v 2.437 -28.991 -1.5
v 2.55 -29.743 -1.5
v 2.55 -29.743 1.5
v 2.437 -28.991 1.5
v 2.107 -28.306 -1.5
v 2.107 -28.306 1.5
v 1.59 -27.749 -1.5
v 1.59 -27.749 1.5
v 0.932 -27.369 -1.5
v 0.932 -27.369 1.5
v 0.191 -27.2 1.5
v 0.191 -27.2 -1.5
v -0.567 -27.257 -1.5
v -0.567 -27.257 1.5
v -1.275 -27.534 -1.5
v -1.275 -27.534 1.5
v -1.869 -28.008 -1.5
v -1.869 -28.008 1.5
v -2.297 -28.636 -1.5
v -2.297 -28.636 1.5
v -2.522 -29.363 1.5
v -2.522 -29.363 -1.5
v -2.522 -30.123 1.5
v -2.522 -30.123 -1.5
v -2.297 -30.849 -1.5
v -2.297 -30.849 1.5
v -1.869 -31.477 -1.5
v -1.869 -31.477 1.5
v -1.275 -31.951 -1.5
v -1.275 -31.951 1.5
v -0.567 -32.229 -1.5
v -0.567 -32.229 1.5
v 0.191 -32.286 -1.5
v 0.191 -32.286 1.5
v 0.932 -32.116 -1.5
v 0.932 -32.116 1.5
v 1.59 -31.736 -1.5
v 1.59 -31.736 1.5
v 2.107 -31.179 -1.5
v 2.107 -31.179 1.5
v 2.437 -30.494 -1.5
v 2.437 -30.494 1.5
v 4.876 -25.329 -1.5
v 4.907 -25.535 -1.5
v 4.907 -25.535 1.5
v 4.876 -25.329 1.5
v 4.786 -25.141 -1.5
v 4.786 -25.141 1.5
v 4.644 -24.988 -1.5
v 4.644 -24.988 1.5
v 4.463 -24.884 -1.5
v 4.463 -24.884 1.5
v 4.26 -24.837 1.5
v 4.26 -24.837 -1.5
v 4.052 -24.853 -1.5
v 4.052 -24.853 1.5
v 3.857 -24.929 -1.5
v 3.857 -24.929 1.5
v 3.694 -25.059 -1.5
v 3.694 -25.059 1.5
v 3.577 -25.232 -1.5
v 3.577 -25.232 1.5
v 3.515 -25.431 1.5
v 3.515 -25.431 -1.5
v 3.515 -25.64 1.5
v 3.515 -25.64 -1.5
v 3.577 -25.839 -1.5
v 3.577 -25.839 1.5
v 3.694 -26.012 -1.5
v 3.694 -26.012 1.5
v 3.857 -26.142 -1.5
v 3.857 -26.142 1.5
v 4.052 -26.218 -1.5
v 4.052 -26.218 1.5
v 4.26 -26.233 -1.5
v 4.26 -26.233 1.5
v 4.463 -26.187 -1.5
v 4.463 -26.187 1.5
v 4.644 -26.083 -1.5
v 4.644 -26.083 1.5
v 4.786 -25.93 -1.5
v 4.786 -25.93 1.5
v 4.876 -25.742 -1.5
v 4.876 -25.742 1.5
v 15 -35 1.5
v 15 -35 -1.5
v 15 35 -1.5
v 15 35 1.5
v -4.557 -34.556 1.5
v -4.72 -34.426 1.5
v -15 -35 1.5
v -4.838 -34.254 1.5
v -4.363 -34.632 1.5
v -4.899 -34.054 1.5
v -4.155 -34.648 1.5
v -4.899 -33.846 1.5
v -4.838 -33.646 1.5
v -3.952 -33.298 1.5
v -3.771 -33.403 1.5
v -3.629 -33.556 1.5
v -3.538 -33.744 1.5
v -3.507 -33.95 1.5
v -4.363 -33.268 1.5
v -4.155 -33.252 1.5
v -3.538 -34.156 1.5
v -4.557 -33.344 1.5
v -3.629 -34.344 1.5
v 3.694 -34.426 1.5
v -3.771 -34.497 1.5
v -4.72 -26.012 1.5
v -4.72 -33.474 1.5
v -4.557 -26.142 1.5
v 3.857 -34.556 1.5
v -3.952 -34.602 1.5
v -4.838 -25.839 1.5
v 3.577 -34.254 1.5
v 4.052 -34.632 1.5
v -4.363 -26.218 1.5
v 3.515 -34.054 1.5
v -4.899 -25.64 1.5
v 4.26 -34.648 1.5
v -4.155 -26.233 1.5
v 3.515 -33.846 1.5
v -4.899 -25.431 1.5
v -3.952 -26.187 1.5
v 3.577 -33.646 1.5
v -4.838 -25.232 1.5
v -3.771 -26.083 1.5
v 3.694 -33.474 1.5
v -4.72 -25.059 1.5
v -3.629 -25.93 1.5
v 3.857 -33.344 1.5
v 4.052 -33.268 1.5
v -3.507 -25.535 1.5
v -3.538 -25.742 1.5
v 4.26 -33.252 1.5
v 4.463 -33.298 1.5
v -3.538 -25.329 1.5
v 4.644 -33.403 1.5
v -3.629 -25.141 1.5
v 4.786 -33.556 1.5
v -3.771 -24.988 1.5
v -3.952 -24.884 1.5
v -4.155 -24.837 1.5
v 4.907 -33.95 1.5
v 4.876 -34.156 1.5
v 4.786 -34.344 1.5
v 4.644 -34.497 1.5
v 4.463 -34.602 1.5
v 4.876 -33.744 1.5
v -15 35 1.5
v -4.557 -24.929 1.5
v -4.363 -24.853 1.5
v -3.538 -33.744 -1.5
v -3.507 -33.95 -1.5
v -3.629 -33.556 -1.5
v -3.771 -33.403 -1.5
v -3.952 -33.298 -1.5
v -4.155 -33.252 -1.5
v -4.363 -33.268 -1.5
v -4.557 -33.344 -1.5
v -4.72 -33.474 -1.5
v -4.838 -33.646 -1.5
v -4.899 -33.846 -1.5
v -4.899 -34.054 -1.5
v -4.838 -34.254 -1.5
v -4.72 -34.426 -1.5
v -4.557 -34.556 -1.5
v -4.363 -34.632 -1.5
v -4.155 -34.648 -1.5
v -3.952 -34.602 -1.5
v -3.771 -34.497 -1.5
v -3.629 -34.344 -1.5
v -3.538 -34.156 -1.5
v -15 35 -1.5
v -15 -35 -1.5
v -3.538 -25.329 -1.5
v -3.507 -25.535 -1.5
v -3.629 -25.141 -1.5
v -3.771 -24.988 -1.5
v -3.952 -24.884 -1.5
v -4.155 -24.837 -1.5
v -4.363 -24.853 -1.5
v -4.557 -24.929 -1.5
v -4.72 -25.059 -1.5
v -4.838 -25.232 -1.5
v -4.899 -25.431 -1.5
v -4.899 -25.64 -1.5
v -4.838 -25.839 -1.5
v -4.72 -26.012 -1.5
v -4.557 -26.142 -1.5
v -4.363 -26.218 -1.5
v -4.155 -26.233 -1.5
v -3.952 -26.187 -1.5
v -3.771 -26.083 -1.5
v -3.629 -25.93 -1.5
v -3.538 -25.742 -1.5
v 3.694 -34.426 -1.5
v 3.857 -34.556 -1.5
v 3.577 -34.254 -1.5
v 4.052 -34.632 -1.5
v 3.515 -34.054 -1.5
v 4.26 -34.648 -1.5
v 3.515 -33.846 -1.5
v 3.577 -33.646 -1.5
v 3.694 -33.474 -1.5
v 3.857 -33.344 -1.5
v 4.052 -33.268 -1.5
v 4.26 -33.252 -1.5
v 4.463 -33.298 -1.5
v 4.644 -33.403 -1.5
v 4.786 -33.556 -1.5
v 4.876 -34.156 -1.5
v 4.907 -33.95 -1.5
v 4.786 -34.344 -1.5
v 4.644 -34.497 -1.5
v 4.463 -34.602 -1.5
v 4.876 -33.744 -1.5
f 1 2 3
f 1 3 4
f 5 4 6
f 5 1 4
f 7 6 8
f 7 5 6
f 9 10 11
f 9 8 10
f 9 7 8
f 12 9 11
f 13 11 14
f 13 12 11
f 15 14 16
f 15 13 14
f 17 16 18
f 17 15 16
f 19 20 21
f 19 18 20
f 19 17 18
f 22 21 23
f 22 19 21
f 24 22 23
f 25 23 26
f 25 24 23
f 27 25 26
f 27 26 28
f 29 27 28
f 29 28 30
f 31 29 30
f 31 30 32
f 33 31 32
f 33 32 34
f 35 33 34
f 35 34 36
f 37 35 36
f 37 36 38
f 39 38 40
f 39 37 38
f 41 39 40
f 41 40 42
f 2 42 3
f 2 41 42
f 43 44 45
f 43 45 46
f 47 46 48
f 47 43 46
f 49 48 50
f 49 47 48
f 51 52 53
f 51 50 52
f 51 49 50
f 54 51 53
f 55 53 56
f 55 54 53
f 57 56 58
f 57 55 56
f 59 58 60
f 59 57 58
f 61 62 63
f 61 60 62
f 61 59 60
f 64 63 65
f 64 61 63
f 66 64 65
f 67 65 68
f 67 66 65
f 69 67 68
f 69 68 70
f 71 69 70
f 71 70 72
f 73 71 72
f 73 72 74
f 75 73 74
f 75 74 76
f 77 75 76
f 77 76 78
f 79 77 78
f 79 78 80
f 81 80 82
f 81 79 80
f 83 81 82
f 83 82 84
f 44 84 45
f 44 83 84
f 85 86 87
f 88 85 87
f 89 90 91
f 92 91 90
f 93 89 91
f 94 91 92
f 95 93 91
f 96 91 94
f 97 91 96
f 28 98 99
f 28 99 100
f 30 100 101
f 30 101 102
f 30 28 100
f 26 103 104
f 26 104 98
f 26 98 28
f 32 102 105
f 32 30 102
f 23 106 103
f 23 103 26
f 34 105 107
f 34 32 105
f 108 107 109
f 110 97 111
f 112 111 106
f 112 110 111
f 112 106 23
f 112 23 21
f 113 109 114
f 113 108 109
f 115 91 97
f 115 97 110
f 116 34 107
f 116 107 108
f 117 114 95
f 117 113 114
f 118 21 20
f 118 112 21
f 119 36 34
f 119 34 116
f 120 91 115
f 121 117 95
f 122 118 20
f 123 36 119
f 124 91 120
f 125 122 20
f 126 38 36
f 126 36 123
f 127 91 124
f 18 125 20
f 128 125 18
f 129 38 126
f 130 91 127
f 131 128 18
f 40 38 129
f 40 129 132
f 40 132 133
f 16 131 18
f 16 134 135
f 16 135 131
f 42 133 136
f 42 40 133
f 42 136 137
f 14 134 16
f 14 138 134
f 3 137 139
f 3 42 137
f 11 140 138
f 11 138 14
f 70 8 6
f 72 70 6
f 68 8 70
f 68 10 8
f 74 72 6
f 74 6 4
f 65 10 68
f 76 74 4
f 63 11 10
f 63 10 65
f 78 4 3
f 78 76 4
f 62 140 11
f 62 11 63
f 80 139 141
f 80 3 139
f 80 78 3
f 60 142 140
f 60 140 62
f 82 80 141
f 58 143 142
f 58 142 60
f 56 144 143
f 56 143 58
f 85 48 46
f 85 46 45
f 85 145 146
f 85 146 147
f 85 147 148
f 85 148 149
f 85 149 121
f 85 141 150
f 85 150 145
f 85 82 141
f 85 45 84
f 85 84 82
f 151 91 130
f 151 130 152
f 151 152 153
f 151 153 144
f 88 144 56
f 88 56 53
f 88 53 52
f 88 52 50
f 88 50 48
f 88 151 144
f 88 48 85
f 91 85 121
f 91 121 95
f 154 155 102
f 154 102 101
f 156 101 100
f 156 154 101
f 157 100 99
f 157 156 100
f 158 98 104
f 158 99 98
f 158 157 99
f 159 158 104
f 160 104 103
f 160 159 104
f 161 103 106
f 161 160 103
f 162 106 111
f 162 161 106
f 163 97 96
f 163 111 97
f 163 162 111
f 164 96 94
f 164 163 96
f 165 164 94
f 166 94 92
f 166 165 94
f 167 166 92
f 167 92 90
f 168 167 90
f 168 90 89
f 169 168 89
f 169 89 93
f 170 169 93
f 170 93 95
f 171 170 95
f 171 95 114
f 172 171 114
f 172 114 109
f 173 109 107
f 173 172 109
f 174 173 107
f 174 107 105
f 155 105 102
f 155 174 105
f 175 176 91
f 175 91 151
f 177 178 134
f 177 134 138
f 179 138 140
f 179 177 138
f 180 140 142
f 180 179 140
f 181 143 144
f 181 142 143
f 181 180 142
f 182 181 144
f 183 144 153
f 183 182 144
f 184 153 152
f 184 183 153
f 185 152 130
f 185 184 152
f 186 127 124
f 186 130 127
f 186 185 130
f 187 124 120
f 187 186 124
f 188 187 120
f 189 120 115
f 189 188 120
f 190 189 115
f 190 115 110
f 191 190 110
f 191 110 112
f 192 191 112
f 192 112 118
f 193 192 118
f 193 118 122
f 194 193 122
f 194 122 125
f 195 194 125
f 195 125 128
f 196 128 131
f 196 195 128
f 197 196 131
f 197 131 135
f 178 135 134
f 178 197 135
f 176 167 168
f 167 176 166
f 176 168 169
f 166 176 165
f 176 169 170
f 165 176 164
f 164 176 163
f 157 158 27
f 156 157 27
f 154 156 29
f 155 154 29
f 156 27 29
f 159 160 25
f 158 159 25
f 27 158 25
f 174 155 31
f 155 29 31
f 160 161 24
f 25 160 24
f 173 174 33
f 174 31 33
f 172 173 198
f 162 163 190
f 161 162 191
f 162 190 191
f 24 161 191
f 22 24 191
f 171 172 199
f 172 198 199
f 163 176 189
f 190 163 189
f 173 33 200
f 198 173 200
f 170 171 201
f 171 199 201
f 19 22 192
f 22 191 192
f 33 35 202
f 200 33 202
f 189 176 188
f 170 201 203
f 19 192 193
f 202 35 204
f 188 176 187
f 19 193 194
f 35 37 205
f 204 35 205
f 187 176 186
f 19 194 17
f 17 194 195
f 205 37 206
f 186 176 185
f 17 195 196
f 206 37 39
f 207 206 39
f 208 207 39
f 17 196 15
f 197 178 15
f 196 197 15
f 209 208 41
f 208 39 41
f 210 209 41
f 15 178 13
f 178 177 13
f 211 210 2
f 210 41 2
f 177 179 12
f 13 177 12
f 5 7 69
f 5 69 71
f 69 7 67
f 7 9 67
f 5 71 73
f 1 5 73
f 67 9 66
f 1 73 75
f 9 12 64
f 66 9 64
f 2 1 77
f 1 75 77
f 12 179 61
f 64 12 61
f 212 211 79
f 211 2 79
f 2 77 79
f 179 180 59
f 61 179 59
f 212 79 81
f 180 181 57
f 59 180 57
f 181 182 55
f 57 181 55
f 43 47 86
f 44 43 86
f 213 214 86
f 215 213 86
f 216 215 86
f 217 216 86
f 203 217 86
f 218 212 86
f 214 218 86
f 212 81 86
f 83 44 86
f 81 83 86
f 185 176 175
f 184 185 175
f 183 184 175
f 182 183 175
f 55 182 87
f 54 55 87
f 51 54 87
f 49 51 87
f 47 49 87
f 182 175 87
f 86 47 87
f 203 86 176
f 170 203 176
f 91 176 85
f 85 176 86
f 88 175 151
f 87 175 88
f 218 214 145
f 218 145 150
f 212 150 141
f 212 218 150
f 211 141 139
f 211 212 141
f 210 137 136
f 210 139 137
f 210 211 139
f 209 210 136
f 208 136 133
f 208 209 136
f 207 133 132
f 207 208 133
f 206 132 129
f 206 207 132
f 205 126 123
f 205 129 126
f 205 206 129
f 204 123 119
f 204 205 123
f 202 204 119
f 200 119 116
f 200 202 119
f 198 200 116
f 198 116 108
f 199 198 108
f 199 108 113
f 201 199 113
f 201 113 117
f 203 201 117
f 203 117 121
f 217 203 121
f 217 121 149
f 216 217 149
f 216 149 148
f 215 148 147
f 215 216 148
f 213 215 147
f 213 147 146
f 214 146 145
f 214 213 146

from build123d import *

# Parameters (mm, degrees)
MAINBODY_EXTRUDE_START            = -1.5
PROJECTIONXY_SKETCH_W             = 30
PROJECTIONXY_SKETCH_H             = 70
MAINBODY_EXTRUDE_DEPTH            = 3
BORE_CUT_DEPTH                    = 39.108398025
BORE_CUT_DEPTH_BACK               = 39.108398025
BORE_SKETCH_R                     = 2.55
POSTCLEARANCEHOLES_CUT_DEPTH      = 39.108398025
POSTCLEARANCEHOLES_CUT_DEPTH_BACK = 39.108398025
POSTCLEARANCEHOLES_SKETCH_R       = 0.7


with BuildPart() as part:
    # projectionXy_sketch → mainBody_extrude (new body)
    with BuildSketch(Plane.XY.offset(MAINBODY_EXTRUDE_START)):
        Rectangle(PROJECTIONXY_SKETCH_W, PROJECTIONXY_SKETCH_H)
    extrude(amount=MAINBODY_EXTRUDE_DEPTH)

    # bore_sketch → bore_cut (cut, two sides: drawn at the far end of the back side and taken through both)
    with BuildSketch(Plane.XY.offset(-BORE_CUT_DEPTH_BACK)):
        with Locations((0, -29.742714652)):
            Circle(BORE_SKETCH_R)
    extrude(amount=BORE_CUT_DEPTH + BORE_CUT_DEPTH_BACK, mode=Mode.SUBTRACT)

    # postClearanceHoles_sketch → postClearanceHoles_cut (cut, two sides: drawn at the far end of the back side and taken through both)
    with BuildSketch(Plane.XY.offset(-POSTCLEARANCEHOLES_CUT_DEPTH_BACK)):
        with Locations((4.207285348, -25.535429304)):
            Circle(POSTCLEARANCEHOLES_SKETCH_R)
        with Locations((-4.207285348, -25.535429304)):
            Circle(POSTCLEARANCEHOLES_SKETCH_R)
        with Locations((-4.207285348, -33.95)):
            Circle(POSTCLEARANCEHOLES_SKETCH_R)
        with Locations((4.207285348, -33.95)):
            Circle(POSTCLEARANCEHOLES_SKETCH_R)
    extrude(amount=POSTCLEARANCEHOLES_CUT_DEPTH + POSTCLEARANCEHOLES_CUT_DEPTH_BACK, mode=Mode.SUBTRACT)


solid = part.part
